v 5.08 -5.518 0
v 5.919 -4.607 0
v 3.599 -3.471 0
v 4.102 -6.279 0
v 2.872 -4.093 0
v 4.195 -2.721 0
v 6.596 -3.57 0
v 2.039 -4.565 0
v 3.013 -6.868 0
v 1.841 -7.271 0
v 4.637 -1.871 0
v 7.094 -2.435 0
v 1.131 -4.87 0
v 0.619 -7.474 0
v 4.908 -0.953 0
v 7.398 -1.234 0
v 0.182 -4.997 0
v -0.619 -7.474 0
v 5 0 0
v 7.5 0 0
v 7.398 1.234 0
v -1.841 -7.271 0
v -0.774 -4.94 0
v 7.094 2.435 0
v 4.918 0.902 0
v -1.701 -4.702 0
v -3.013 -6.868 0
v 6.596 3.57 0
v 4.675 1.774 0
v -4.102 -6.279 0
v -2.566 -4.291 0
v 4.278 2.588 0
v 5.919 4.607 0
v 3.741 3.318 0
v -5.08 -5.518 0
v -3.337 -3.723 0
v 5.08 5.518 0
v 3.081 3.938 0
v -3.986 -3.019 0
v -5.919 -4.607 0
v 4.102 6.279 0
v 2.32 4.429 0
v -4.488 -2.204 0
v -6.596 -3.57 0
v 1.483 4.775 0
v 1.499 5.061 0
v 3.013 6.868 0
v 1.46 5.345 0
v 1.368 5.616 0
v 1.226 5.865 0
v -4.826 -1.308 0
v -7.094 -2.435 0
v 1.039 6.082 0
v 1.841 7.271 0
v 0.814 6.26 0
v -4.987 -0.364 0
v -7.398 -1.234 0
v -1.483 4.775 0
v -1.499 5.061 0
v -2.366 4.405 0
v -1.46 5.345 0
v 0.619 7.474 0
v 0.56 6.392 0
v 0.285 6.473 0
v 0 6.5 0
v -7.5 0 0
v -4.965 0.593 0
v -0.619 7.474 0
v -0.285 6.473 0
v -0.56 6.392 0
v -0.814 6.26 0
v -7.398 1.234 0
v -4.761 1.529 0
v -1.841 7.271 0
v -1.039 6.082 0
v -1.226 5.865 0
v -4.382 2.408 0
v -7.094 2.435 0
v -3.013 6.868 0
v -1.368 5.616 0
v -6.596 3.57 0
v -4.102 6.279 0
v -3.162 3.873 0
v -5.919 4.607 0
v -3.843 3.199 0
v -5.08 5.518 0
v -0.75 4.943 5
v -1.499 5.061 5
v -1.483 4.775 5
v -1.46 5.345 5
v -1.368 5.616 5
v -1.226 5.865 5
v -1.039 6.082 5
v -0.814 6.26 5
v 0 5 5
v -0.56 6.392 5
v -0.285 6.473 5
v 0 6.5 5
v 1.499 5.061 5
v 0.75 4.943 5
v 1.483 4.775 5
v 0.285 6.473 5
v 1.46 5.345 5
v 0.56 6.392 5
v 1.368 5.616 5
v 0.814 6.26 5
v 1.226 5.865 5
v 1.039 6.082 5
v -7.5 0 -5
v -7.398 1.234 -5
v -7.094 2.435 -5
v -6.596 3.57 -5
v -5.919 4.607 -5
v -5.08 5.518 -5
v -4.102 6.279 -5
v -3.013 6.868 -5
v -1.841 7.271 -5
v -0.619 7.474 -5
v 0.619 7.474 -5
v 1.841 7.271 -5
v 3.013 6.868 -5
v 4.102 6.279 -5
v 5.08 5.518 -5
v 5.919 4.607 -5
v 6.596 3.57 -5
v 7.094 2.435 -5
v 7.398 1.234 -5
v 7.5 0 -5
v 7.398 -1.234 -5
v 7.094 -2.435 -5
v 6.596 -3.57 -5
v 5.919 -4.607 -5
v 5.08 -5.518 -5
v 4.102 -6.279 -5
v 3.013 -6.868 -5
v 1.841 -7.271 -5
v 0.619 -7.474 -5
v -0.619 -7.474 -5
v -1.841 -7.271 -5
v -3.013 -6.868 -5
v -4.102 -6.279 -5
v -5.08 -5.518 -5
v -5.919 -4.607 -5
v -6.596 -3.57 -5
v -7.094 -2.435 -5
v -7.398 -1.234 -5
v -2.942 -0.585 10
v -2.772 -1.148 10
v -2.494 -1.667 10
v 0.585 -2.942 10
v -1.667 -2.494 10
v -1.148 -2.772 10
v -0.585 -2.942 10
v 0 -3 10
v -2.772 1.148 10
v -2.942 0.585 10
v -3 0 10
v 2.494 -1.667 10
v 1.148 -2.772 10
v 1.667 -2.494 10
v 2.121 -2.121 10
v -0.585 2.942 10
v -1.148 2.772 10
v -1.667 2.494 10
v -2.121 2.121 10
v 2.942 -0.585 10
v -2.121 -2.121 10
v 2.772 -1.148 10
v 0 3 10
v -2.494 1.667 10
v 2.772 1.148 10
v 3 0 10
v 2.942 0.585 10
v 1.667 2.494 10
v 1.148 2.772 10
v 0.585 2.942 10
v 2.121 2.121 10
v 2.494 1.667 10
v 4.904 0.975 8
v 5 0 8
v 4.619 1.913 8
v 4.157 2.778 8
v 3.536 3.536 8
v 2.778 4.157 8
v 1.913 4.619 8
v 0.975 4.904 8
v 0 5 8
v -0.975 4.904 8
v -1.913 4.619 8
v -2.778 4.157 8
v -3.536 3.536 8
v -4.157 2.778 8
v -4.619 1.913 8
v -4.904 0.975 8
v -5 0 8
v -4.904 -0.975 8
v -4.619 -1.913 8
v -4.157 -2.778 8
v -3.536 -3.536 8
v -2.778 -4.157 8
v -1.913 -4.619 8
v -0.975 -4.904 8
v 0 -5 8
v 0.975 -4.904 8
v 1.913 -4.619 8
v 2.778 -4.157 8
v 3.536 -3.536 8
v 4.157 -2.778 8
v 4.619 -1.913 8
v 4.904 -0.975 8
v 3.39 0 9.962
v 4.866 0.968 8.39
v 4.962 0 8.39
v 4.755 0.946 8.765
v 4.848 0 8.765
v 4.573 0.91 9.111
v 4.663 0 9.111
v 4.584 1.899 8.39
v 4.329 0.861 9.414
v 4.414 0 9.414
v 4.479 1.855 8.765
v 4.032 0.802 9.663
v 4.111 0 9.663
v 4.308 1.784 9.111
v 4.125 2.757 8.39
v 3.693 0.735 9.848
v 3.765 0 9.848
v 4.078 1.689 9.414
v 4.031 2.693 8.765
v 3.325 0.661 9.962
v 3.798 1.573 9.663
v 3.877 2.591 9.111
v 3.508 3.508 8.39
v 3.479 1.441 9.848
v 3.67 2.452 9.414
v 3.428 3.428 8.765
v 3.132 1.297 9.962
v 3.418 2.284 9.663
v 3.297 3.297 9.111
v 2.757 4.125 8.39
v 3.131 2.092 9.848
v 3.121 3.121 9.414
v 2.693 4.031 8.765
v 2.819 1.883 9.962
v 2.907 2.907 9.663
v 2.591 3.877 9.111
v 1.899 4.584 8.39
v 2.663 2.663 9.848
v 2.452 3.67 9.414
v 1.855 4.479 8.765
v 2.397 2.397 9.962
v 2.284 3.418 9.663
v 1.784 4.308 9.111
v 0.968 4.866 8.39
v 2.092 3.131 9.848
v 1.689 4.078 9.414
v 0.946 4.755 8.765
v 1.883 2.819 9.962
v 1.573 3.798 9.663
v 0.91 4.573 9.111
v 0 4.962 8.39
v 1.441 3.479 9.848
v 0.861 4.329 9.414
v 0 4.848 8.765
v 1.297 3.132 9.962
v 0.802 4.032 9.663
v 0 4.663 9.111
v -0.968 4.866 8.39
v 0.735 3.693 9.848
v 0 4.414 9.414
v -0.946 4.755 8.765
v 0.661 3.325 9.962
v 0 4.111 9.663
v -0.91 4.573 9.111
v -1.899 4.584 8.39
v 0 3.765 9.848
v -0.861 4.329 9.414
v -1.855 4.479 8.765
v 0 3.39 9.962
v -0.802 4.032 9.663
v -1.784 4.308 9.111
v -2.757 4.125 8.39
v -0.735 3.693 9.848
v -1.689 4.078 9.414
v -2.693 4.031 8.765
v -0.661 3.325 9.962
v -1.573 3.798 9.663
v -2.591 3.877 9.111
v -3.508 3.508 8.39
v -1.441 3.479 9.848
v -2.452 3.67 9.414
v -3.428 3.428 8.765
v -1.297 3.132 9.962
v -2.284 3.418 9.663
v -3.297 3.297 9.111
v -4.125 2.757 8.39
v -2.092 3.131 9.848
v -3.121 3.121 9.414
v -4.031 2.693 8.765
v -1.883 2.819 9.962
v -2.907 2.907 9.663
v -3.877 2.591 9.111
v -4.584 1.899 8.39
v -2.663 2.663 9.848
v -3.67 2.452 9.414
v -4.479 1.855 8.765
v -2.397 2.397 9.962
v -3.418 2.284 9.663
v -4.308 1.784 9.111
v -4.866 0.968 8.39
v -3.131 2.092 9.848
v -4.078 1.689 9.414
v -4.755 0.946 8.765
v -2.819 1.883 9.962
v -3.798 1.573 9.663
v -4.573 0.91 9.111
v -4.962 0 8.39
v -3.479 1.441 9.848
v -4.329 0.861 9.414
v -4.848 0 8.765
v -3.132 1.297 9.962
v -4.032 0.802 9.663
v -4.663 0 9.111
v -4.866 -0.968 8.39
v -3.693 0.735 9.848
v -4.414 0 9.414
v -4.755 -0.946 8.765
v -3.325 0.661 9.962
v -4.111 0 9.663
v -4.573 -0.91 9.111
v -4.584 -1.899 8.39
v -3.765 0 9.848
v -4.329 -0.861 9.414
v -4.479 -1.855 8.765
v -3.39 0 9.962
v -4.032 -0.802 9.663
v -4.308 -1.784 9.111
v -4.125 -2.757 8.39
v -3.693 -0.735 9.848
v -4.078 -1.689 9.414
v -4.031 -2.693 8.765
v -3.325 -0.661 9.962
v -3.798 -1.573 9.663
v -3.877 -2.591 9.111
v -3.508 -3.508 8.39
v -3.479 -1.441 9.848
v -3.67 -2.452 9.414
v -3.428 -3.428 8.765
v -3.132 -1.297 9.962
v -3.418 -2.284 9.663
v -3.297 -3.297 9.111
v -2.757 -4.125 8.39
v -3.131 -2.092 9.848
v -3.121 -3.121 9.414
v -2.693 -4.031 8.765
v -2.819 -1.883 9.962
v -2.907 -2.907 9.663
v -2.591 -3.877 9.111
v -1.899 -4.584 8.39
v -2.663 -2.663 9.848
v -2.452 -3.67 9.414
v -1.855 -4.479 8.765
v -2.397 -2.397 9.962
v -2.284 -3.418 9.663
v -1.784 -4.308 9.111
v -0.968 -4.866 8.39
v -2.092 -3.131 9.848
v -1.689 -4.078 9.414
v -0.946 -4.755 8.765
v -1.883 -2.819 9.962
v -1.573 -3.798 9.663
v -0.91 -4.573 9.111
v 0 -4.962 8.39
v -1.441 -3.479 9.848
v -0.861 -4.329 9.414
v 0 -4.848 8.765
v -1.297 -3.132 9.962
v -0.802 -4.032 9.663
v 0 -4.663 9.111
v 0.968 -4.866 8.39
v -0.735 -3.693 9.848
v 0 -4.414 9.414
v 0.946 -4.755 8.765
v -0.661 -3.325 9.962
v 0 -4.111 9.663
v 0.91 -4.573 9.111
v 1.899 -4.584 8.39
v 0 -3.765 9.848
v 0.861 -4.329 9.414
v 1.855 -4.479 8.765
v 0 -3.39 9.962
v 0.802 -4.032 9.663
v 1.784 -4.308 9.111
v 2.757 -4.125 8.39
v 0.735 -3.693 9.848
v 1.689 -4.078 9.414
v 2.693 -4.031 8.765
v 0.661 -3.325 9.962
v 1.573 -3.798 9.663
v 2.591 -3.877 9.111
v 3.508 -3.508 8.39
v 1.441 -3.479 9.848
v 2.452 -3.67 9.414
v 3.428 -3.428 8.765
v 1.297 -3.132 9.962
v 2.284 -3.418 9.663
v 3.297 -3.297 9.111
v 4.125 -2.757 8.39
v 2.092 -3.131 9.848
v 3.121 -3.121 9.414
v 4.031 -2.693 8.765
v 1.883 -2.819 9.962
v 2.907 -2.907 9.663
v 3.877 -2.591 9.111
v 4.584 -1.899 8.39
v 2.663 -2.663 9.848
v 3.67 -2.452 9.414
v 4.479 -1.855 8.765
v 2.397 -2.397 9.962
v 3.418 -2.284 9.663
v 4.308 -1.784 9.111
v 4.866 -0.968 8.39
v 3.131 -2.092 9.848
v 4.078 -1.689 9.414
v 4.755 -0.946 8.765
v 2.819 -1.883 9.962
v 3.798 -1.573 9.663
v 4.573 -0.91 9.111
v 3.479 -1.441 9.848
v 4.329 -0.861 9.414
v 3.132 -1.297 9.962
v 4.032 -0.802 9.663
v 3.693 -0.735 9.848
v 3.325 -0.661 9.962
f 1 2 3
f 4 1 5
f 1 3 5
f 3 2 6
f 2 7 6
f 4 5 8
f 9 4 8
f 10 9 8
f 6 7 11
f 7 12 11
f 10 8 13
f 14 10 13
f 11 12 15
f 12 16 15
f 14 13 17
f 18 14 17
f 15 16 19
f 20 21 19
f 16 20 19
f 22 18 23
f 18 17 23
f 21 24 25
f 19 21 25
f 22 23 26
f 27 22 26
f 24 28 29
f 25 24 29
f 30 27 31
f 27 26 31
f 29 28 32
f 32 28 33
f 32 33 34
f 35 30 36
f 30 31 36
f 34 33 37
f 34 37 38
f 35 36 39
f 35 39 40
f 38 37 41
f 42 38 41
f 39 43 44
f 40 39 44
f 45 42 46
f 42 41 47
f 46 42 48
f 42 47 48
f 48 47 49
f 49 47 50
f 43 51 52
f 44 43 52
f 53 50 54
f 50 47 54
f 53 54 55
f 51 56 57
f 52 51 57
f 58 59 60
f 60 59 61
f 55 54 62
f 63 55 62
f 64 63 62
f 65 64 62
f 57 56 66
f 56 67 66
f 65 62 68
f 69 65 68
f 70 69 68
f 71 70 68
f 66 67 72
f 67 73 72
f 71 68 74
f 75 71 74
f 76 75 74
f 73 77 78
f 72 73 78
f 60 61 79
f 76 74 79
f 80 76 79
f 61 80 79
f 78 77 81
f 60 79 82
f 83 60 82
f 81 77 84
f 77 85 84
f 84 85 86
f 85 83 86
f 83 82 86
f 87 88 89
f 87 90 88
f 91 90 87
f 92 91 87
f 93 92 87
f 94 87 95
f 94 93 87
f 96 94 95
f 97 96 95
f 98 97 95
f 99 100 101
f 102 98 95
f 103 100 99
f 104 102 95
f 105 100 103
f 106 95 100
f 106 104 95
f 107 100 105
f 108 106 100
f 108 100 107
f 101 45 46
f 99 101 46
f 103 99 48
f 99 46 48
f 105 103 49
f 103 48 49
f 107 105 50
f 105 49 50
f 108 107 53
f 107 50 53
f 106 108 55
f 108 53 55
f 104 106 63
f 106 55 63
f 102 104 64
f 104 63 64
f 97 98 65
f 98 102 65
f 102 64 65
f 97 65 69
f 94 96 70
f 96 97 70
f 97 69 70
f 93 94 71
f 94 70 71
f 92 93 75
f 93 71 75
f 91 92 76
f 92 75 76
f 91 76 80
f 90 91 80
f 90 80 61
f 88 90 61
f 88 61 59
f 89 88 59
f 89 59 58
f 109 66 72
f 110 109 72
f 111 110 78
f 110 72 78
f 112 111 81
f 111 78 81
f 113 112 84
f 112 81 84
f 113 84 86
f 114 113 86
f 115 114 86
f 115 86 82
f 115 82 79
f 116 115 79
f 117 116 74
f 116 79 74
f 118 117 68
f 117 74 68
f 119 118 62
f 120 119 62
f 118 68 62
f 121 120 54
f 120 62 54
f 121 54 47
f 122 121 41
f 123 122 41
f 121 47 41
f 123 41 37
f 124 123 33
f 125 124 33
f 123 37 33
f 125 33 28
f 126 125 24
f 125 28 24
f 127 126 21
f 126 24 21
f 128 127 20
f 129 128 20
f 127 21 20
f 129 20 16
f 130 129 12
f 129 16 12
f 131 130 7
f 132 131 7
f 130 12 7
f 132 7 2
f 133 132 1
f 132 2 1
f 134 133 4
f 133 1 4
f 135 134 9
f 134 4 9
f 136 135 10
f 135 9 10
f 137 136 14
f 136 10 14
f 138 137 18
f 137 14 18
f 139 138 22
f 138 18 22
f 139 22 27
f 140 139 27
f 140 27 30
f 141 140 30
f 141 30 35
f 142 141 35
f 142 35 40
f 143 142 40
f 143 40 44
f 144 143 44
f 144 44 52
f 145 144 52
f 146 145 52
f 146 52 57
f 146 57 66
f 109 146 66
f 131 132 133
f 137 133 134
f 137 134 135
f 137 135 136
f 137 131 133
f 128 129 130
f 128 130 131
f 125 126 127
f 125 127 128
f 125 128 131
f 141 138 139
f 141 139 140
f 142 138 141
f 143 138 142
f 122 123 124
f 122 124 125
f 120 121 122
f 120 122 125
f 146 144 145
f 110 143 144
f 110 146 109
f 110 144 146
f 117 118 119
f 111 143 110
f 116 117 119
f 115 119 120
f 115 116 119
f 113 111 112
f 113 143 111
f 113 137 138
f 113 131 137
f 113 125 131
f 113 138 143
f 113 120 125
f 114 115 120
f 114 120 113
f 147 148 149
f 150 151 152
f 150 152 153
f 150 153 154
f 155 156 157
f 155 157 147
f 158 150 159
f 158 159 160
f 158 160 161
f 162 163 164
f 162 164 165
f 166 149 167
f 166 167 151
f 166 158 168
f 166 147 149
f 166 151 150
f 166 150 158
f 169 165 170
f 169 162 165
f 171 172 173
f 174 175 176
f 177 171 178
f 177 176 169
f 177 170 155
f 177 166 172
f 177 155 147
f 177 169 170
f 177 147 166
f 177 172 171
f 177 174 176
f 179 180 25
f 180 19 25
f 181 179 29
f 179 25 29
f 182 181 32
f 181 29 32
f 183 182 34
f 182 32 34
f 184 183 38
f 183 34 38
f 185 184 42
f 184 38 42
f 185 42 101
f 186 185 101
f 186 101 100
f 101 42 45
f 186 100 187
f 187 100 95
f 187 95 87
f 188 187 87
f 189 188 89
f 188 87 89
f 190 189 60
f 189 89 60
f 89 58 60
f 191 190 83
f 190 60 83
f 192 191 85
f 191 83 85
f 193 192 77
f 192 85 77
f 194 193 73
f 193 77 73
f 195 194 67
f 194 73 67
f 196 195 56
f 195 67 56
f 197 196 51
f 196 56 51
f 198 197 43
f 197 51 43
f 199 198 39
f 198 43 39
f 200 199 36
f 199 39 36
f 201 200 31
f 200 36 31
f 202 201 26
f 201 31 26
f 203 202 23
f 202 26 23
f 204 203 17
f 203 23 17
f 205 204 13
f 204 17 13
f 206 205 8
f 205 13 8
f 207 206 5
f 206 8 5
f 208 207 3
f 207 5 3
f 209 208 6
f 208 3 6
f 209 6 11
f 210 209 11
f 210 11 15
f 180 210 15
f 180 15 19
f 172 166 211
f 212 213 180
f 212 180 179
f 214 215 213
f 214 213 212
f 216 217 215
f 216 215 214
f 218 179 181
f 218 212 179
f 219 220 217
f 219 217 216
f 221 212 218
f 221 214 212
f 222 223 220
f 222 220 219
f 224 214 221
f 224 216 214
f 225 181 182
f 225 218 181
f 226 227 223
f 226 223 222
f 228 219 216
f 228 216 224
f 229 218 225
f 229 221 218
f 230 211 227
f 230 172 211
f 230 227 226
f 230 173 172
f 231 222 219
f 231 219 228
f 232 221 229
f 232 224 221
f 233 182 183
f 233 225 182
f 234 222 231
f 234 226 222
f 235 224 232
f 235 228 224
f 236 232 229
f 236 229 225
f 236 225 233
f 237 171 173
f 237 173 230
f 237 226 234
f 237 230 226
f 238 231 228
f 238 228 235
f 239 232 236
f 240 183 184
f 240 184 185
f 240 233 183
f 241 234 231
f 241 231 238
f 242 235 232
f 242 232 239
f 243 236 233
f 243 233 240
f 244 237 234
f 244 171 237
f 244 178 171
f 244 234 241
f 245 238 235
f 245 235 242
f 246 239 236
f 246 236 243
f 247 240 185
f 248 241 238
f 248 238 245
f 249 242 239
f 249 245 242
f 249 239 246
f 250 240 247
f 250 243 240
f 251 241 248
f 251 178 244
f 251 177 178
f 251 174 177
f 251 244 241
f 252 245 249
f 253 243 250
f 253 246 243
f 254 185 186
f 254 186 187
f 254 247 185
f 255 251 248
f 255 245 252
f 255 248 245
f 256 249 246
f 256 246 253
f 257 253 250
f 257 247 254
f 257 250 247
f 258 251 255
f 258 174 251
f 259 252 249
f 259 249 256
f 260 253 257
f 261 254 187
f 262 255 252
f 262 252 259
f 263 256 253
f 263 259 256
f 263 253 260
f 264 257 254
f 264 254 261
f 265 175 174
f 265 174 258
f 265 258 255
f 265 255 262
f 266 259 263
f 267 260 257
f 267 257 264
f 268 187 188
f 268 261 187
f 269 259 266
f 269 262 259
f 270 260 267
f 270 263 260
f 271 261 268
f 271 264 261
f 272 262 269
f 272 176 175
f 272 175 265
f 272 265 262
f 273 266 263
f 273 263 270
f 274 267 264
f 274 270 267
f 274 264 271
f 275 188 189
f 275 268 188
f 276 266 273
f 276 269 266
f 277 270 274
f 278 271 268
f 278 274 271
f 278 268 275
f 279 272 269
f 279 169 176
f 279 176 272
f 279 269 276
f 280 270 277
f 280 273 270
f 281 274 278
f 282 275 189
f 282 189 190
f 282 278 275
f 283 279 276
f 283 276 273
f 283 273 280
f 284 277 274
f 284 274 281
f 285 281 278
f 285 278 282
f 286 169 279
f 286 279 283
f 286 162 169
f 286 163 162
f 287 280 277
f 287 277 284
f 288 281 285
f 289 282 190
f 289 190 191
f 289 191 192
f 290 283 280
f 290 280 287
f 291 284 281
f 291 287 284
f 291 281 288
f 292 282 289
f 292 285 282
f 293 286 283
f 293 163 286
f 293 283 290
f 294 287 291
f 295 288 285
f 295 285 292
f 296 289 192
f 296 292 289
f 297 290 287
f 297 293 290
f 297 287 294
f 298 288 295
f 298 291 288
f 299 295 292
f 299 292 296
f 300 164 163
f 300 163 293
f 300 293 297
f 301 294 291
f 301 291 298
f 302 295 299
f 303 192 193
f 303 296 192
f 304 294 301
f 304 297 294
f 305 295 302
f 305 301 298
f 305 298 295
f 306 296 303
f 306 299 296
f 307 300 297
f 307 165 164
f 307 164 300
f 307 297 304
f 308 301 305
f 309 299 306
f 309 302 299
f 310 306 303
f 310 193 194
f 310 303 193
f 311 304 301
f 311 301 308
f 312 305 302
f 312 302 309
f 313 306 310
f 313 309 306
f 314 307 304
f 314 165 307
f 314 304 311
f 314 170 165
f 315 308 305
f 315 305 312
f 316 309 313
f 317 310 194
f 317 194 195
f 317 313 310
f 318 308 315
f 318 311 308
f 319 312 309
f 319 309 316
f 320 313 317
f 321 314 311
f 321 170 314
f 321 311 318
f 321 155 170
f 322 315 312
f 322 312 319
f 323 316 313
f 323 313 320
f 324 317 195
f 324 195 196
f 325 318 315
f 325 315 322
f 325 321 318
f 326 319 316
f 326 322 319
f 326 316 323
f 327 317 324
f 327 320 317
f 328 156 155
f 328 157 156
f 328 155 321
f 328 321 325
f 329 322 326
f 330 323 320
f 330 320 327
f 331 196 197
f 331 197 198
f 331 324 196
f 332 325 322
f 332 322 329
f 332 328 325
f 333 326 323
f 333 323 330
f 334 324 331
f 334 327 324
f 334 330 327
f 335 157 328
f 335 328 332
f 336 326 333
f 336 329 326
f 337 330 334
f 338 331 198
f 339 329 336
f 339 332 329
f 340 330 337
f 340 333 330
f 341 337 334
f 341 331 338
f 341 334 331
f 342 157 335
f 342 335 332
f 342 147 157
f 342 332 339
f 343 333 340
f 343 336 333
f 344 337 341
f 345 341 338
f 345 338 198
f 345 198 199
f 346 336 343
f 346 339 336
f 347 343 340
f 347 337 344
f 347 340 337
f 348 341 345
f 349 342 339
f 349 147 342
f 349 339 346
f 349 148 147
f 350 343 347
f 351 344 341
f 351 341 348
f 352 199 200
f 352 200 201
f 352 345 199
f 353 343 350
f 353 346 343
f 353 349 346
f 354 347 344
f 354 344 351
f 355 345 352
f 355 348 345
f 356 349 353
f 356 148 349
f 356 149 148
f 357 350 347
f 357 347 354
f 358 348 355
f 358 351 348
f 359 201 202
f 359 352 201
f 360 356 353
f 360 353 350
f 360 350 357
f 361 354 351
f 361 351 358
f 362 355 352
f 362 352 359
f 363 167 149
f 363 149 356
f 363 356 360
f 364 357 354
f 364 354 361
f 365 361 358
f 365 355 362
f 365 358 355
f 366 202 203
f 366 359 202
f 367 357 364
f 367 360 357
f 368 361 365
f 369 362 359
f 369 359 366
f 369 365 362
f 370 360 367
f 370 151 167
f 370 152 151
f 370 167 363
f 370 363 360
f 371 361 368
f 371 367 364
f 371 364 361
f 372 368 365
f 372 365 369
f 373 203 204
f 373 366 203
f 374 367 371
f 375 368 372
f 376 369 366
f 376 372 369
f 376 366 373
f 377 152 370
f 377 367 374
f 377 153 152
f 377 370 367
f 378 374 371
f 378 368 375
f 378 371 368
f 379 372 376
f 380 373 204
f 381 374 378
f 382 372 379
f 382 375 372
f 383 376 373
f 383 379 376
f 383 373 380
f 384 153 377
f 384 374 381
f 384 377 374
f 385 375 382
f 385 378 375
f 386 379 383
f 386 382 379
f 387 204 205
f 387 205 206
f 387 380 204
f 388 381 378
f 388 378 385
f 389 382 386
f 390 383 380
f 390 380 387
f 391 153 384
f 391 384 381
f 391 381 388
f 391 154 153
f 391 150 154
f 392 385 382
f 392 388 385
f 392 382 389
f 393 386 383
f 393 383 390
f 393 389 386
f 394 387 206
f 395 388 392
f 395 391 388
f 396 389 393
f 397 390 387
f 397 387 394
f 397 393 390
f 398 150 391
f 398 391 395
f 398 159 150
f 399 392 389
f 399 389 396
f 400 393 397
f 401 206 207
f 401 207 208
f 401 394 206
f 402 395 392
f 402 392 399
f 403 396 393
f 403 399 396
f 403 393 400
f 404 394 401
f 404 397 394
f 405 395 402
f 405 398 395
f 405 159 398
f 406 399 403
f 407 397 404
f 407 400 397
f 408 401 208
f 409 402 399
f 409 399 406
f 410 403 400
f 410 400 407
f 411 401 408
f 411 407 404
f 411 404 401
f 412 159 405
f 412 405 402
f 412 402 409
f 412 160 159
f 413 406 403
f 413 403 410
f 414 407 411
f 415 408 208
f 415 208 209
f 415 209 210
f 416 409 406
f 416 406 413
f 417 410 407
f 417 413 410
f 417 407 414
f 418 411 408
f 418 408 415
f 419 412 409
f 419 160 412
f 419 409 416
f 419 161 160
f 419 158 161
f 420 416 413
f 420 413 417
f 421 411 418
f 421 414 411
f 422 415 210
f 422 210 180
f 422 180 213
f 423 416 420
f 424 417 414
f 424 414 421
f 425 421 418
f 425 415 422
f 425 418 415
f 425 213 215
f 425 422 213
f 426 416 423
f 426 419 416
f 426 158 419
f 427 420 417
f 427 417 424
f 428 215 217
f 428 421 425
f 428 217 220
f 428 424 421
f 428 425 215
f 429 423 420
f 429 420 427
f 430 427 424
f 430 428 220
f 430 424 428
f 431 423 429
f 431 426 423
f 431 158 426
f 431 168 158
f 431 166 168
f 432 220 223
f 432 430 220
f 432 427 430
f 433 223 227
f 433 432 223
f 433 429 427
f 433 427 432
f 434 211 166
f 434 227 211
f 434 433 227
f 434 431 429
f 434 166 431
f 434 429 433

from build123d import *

# Parameters (mm, degrees)
SKETCH_1_R      = 5
EXTRUDE_1_DEPTH = 10
SKETCH_2_R      = 7.5
EXTRUDE_2_DEPTH = 5
FILLET_1_R      = 2
SKETCH_5_R      = 1.5
EXTRUDE_4_DEPTH = 5


with BuildPart() as part:
    # 草图1 → 凸台-拉伸1 (new body)
    with BuildSketch(Plane.XY):
        Circle(SKETCH_1_R)
    extrude(amount=EXTRUDE_1_DEPTH)

    # 草图2 → 凸台-拉伸2 (add)
    with BuildSketch(Plane(origin=(0, 0, 0), x_dir=(-1, 0, 0), z_dir=(0, 0, -1))):
        Circle(SKETCH_2_R)
    extrude(amount=EXTRUDE_2_DEPTH)

    # 圆角1
    fillet_1_edges = [part.edges().sort_by_distance(p)[0] for p in [
        (-5, 0, 10),
    ]]
    fillet(fillet_1_edges, radius=FILLET_1_R)

    # 草图5 → 凸台-拉伸4 (add)
    with BuildSketch(Plane.XY):
        with Locations((0, 5)):
            Circle(SKETCH_5_R)
    extrude(amount=EXTRUDE_4_DEPTH)


solid = part.part
